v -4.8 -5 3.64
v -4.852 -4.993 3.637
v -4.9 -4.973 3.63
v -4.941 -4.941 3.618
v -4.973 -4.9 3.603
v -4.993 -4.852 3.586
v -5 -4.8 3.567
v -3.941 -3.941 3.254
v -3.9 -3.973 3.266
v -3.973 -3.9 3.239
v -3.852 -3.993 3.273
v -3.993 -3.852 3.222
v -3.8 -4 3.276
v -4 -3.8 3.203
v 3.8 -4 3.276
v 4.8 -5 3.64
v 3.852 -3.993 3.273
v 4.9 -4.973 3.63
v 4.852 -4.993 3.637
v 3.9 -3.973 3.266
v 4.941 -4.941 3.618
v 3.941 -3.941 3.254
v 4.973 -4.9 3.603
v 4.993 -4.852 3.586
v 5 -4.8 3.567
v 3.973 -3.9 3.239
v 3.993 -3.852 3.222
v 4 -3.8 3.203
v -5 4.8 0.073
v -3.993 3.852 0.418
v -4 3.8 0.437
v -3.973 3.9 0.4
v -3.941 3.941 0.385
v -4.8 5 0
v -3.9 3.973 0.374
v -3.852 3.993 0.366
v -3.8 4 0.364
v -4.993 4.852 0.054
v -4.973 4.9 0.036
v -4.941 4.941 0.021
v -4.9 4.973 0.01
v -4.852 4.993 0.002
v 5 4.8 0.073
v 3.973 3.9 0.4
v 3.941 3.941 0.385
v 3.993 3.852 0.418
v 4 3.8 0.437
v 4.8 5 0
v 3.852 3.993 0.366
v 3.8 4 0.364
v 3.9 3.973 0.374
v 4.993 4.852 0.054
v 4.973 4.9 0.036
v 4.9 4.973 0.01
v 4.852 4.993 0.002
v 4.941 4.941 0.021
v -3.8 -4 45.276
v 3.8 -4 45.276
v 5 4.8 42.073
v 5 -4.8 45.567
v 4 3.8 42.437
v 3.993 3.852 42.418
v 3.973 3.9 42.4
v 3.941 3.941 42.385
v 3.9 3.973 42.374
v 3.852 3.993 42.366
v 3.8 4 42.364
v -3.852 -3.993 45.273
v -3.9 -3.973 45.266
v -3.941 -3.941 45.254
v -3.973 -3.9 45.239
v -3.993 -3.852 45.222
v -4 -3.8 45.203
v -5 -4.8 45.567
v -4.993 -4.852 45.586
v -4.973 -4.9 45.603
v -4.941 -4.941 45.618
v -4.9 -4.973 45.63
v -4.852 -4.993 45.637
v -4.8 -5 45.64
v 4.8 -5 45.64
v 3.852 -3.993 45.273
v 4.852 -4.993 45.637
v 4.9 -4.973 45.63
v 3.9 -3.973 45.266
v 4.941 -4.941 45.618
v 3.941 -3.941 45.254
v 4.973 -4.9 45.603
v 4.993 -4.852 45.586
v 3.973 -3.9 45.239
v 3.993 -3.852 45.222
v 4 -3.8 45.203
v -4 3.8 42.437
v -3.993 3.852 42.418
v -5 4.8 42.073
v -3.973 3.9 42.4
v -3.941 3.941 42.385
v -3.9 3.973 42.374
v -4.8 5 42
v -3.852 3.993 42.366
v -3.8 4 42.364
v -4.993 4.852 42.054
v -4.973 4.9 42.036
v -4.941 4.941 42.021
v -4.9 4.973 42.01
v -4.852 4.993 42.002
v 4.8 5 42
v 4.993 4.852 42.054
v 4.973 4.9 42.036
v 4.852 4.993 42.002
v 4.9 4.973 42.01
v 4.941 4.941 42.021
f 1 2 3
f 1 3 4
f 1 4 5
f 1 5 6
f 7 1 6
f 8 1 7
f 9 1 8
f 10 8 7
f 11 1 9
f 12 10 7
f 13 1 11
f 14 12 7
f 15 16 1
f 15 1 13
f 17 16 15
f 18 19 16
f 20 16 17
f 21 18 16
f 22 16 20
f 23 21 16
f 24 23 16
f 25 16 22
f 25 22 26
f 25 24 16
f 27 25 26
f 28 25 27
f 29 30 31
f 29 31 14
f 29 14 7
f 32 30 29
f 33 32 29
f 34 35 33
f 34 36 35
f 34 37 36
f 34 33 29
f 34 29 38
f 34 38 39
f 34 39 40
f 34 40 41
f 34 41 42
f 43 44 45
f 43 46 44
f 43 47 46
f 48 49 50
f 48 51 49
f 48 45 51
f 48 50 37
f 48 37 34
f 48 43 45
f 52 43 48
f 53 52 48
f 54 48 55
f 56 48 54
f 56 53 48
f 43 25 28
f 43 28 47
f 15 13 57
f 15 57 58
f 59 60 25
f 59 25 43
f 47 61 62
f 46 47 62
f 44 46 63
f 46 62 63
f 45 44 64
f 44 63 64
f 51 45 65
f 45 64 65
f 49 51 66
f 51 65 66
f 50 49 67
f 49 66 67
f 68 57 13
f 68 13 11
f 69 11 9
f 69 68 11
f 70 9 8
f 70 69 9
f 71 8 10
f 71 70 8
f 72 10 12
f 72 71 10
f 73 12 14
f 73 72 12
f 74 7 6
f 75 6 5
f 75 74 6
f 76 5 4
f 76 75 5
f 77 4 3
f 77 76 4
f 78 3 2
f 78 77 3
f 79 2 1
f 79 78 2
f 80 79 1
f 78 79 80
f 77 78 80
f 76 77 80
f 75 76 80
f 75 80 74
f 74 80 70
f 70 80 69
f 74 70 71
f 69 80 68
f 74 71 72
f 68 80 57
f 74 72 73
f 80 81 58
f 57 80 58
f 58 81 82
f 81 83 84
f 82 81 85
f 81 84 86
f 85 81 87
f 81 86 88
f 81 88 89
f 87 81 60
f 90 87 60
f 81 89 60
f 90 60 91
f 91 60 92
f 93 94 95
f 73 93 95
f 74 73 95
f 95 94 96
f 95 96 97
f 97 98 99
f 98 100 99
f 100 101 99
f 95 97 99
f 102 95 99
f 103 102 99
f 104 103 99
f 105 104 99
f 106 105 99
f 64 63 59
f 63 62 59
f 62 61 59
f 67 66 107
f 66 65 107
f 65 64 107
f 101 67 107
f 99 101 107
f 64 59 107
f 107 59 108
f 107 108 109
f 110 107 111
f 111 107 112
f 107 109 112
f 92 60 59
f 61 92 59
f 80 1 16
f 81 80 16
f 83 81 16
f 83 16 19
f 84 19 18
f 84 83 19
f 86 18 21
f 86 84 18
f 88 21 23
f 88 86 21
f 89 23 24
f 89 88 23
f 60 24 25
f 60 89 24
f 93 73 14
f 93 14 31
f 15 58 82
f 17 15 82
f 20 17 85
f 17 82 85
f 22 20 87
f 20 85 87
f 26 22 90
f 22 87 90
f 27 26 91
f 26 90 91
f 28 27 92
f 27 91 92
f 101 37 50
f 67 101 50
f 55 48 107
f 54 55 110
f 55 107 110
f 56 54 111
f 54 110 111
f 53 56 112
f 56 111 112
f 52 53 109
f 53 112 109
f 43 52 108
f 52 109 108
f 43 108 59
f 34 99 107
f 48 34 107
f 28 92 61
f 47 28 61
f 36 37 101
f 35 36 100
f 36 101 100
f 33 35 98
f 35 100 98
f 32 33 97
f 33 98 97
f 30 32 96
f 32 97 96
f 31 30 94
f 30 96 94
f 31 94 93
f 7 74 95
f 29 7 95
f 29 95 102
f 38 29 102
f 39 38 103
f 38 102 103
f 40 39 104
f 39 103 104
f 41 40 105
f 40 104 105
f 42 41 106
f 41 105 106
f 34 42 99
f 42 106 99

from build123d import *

# Parameters (mm, degrees)
SKETCH_1_W          = 10
SKETCH_1_H          = 10
SKETCH_1_W_2        = 8
SKETCH_1_H_2        = 8
EXTRUDE_1_DEPTH     = 200
FILLET_1_R          = 0.2
CUT_EXTRUDE_1_DEPTH = 201.31225624
CUT_EXTRUDE_2_DEPTH = 201.31225624


with BuildPart() as part:
    # 草圖1 → 填料-伸長1 (new body)
    with BuildSketch(Plane.XY):
        Rectangle(SKETCH_1_W, SKETCH_1_H)
        Rectangle(SKETCH_1_W_2, SKETCH_1_H_2, mode=Mode.SUBTRACT)
    extrude(amount=EXTRUDE_1_DEPTH)

    # 圓角1
    fillet_1_edges = [part.edges().sort_by_distance(p)[0] for p in [
        (-4, 4, 100),
        (-4, -4, 100),
        (4, -4, 100),
        (4, 4, 100),
        (-5, 5, 100),
        (5, 5, 100),
        (5, -5, 100),
        (-5, -5, 100),
    ]]
    fillet(fillet_1_edges, radius=FILLET_1_R)

    # 草圖2 → 除料-伸長1 (cut, through all)
    with BuildSketch(Plane(origin=(5, 0, 0), x_dir=(0, 0, -1), z_dir=(1, 0, 0))):
        Polygon((0, 5), (0, -5), (-3.639702343, -5), align=None)
    extrude(amount=-CUT_EXTRUDE_1_DEPTH, mode=Mode.SUBTRACT)

    # 草圖3 → 除料-伸長2 (cut, through all)
    with BuildSketch(Plane(origin=(5, 0, 0), x_dir=(0, 0, -1), z_dir=(1, 0, 0))):
        Polygon((-45.639702343, -5), (-42, 5), (-200, 5), (-200, -5), align=None)
    extrude(amount=-CUT_EXTRUDE_2_DEPTH, mode=Mode.SUBTRACT)


solid = part.part
